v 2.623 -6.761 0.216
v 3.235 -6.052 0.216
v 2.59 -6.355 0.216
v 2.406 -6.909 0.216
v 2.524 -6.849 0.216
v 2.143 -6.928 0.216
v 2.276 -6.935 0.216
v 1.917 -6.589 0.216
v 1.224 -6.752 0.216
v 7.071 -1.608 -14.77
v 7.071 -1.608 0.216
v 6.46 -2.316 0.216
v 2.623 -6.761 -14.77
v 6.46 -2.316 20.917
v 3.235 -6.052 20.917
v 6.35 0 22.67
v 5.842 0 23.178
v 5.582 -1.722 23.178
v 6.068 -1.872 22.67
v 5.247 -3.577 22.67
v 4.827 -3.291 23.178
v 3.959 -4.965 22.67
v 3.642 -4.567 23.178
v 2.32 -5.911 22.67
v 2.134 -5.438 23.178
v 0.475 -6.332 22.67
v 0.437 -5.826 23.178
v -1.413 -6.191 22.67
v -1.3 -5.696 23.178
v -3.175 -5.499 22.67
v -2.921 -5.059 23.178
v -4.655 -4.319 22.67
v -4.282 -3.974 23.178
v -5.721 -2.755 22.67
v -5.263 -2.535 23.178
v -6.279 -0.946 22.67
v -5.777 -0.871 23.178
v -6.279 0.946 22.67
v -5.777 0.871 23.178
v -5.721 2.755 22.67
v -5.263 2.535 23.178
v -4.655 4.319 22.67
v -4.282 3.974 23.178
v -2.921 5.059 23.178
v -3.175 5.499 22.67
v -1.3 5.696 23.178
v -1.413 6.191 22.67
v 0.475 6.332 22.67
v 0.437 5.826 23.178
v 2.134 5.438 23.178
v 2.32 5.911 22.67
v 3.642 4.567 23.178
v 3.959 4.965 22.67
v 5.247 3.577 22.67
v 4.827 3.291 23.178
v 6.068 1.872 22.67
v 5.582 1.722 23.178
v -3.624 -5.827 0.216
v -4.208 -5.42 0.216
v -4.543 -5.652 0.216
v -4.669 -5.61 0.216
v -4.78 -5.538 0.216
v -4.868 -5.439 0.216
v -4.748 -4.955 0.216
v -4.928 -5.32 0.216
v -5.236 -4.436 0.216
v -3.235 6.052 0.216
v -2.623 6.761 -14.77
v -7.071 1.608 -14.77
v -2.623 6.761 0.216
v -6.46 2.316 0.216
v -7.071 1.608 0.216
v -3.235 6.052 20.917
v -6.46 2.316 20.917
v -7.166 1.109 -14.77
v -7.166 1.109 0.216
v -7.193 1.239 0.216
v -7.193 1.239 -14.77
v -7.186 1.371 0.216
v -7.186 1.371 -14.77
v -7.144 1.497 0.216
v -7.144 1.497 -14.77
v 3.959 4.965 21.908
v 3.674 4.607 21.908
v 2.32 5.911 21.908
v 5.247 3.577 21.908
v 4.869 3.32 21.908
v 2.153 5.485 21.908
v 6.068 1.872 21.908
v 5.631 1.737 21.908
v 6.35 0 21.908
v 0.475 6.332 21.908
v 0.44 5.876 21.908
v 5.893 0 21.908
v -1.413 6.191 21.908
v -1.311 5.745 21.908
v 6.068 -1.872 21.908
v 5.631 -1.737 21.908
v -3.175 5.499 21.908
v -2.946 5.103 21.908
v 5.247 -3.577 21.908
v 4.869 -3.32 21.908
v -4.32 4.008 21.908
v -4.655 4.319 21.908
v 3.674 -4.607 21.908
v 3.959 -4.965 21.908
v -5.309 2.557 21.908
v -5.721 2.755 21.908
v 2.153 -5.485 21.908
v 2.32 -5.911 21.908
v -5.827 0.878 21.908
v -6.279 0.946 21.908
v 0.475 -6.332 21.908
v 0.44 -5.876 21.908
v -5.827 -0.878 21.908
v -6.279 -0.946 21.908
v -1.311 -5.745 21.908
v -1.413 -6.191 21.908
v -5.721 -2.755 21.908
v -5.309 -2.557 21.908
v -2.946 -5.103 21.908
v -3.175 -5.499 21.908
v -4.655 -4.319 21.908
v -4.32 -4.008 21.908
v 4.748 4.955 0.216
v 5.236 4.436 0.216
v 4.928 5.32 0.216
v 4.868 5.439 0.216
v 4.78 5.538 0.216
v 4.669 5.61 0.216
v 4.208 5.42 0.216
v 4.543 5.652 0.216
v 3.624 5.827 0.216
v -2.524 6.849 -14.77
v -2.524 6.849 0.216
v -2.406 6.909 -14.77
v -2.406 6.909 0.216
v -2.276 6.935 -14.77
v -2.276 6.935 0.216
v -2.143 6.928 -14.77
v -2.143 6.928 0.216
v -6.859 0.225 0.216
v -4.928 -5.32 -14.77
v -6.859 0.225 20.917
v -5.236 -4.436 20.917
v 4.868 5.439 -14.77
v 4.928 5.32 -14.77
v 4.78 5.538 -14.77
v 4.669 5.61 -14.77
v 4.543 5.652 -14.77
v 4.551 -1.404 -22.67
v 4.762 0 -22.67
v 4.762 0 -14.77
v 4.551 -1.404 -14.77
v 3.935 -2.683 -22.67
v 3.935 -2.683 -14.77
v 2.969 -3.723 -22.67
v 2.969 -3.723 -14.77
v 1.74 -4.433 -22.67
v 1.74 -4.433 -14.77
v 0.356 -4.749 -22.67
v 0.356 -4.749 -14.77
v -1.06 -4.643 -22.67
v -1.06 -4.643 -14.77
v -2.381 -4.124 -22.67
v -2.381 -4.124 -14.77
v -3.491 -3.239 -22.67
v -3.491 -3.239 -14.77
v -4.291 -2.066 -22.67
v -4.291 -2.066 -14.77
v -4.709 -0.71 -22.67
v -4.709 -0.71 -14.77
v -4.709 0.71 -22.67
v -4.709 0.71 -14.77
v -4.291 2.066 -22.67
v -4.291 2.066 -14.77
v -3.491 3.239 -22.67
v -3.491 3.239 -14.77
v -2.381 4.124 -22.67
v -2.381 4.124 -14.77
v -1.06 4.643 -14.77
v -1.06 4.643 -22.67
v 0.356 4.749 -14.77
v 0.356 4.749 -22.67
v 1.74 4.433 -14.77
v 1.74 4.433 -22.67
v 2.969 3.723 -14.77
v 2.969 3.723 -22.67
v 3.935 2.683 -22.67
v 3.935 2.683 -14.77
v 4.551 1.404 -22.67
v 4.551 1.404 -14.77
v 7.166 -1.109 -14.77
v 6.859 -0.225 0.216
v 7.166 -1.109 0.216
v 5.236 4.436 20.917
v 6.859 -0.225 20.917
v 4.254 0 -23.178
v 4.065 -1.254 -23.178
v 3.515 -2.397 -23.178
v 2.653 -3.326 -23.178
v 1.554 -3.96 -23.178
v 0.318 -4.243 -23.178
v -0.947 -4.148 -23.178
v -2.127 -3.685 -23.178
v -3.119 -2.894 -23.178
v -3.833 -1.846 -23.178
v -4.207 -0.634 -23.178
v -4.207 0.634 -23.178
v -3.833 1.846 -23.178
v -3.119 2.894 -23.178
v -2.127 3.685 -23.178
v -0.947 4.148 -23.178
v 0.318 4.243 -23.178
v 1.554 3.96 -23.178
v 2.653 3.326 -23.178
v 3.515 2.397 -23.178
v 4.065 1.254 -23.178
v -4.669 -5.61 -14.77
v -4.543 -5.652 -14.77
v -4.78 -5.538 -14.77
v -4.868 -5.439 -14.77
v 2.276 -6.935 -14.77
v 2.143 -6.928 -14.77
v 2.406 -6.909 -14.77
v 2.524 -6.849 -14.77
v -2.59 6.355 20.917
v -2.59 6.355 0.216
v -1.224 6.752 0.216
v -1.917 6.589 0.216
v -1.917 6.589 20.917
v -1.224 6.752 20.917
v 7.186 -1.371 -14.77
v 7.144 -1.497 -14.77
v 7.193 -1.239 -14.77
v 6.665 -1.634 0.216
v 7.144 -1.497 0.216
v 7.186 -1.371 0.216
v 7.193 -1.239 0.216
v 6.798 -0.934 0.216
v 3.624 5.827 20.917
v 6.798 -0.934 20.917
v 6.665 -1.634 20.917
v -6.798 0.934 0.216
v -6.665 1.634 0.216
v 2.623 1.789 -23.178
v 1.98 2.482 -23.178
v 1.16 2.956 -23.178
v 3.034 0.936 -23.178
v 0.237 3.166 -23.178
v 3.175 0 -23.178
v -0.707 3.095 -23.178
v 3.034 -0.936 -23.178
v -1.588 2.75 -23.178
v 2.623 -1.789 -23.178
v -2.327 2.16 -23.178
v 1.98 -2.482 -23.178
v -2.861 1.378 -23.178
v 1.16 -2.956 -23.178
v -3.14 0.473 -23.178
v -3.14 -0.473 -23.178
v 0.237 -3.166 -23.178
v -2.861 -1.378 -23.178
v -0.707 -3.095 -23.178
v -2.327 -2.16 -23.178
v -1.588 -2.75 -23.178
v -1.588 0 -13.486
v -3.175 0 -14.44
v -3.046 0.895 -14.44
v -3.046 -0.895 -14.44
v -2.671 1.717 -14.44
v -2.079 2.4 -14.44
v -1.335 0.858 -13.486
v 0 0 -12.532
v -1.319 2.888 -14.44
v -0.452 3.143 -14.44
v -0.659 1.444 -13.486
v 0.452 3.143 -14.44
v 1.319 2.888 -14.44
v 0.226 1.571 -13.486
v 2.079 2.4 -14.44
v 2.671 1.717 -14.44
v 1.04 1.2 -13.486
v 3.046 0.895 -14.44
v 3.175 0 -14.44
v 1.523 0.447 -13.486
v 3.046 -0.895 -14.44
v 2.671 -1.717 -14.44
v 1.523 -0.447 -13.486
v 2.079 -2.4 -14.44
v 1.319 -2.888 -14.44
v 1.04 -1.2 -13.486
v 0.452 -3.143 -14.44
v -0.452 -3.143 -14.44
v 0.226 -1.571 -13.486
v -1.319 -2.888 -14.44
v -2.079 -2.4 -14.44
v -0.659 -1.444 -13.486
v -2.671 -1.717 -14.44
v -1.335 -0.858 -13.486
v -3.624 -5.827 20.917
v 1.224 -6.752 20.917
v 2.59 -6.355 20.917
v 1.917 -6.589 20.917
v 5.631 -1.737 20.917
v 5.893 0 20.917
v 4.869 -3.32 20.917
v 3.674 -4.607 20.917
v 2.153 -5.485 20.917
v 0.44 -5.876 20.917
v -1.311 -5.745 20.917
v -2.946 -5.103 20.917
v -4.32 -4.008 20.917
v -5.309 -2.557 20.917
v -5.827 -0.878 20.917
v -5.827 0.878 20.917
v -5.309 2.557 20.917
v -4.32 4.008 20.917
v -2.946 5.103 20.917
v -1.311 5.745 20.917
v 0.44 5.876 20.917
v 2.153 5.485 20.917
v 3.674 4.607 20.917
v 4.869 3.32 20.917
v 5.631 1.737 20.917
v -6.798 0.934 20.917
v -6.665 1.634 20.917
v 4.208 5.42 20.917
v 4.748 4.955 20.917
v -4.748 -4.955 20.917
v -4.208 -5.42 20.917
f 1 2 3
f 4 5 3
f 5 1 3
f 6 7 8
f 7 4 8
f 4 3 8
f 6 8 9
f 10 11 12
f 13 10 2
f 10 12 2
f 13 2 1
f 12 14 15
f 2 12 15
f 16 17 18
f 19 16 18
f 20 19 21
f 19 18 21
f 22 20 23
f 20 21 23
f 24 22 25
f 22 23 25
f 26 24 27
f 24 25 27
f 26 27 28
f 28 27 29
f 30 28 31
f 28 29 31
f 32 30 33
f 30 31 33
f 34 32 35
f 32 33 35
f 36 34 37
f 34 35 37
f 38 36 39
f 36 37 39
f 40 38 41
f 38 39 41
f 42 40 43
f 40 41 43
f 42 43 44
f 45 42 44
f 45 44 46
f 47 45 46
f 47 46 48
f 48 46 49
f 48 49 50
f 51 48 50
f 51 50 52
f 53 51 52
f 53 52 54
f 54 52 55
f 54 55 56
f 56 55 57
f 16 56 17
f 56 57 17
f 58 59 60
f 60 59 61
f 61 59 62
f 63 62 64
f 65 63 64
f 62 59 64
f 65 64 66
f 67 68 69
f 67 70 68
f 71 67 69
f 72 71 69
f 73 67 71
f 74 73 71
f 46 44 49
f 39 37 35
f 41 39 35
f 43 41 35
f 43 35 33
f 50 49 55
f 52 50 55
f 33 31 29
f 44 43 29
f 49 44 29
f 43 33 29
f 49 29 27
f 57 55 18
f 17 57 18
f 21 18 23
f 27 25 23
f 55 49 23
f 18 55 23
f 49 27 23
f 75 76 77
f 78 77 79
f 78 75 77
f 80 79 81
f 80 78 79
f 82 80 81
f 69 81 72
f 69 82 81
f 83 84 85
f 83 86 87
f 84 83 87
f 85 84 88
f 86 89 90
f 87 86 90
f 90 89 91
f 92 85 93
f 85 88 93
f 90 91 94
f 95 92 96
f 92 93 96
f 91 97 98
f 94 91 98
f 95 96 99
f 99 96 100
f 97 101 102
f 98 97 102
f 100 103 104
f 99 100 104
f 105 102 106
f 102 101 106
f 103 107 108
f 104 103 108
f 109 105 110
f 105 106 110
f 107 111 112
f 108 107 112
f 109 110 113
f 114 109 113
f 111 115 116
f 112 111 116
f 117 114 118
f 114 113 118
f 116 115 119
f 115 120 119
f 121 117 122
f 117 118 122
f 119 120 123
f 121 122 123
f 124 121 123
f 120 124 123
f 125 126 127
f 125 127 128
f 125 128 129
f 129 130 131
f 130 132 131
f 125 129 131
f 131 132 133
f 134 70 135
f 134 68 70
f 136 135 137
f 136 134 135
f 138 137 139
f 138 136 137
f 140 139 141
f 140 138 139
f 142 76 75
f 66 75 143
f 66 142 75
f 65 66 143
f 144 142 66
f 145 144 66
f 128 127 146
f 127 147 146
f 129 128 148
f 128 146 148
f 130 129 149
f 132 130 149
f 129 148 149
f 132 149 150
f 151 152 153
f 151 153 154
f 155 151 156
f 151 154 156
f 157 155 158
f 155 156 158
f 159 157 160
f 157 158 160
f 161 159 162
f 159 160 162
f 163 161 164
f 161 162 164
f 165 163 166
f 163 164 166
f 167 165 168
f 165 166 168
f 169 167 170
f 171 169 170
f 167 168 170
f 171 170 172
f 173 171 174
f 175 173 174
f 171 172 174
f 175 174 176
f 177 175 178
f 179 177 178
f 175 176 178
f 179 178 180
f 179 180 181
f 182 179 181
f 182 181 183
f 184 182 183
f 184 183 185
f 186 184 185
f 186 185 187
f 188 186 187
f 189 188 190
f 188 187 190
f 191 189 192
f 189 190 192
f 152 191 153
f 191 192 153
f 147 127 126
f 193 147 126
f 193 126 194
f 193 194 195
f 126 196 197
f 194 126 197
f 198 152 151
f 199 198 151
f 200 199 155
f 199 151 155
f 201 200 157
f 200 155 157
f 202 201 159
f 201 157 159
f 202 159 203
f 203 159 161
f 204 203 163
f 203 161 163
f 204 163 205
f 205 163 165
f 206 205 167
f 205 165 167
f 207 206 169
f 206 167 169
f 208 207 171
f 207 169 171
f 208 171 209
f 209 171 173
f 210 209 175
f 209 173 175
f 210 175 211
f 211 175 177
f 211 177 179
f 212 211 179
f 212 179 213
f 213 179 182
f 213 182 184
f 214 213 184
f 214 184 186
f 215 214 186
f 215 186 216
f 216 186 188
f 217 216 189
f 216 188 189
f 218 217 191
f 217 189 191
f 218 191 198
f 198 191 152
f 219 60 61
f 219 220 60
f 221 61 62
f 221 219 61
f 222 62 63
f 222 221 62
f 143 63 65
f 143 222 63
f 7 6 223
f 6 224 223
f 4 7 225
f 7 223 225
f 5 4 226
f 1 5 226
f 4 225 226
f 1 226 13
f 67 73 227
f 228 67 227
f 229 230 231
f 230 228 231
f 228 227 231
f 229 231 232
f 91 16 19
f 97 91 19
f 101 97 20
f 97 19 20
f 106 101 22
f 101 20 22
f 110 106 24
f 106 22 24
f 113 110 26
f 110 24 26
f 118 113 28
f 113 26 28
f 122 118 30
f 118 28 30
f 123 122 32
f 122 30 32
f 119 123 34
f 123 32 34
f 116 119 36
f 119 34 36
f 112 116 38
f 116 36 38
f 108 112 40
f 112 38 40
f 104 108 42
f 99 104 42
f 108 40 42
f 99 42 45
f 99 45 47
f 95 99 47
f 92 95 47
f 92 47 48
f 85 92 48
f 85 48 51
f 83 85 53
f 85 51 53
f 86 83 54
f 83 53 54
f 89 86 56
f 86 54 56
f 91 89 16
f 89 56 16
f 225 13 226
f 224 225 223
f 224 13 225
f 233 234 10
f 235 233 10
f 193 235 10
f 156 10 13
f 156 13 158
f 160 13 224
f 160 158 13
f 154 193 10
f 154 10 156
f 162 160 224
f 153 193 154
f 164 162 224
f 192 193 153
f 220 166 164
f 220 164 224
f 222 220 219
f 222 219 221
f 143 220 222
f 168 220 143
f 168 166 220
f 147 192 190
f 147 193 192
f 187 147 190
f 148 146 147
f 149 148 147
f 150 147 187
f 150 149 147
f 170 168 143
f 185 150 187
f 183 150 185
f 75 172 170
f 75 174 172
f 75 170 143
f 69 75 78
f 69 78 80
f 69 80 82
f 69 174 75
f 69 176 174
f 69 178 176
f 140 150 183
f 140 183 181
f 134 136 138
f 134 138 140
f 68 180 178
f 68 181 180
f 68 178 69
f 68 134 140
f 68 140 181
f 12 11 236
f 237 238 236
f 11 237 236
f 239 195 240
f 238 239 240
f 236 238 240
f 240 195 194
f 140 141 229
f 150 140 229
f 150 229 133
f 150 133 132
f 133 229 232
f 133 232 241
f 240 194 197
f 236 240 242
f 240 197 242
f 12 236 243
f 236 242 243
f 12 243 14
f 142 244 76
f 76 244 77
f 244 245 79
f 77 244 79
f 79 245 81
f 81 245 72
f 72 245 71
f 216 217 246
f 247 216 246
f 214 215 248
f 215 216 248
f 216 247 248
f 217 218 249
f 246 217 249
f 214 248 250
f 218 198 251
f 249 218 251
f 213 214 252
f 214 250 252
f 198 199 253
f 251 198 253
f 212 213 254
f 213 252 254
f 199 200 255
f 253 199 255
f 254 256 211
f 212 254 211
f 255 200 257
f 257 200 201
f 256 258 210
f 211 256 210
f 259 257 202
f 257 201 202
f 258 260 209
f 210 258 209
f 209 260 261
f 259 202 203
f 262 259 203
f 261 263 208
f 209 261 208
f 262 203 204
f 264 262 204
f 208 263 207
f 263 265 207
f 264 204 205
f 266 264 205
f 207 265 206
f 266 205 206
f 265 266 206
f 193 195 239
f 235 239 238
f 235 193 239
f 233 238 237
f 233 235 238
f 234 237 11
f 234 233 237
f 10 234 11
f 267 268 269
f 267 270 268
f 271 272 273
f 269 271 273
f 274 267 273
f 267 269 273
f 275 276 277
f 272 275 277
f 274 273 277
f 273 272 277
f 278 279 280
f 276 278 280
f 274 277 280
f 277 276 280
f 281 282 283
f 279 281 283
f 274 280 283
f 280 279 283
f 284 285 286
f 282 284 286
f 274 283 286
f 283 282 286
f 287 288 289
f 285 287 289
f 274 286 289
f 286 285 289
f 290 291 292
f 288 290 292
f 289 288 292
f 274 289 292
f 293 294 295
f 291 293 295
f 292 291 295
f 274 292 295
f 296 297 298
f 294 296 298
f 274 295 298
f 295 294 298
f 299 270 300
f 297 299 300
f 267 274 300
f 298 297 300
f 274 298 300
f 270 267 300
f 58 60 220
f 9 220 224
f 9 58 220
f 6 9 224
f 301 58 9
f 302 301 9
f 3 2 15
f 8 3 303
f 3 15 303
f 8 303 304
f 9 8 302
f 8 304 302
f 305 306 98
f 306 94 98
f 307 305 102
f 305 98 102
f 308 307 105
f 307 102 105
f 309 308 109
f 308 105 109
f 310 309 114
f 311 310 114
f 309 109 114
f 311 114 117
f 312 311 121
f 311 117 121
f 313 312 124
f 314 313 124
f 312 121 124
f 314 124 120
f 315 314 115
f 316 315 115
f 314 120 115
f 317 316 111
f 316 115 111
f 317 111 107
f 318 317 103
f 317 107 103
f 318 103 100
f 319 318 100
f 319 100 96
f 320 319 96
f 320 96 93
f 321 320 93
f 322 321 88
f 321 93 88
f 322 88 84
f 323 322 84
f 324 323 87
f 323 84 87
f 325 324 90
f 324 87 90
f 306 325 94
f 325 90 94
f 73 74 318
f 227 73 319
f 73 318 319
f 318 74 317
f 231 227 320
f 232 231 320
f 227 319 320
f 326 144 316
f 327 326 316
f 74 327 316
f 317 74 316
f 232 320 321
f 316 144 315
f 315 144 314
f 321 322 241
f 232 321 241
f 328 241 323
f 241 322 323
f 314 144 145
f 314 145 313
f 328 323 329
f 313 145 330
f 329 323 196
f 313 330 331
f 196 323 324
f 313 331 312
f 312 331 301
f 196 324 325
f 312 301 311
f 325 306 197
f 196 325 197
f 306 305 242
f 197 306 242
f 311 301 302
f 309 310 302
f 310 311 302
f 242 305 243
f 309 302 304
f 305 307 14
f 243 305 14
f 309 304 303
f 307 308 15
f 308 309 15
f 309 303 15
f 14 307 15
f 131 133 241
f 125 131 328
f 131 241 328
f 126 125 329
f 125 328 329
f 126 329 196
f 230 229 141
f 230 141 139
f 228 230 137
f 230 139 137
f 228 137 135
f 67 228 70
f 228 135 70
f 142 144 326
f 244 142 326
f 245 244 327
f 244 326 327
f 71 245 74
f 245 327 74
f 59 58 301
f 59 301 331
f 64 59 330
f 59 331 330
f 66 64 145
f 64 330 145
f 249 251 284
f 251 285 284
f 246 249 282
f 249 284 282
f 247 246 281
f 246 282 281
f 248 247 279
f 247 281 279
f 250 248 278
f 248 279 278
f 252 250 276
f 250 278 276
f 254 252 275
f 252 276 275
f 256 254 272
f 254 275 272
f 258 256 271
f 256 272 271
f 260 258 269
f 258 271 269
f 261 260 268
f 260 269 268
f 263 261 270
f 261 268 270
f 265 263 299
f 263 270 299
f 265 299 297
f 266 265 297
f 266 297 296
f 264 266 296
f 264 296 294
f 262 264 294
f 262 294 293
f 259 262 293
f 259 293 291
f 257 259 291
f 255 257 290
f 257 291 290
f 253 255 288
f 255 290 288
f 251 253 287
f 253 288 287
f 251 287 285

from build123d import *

# Parameters (mm, degrees)
SKETCH3_OUTSIDE_W               = 25.774
SKETCH3_OUTSIDE_H               = 25.774
CUT_EXTRUDE1_DEPTH              = 48.359986768
F_1_4_0_25_DIAMETER_HOLE1_D     = 6.35
F_1_4_0_25_DIAMETER_HOLE1_DEPTH = 8.7376
F_1_4_0_25_DIAMETER_HOLE1_TIP   = 1.907732465
CHAMFER1_SIZE                   = 0.508
BOSS_EXTRUDE1_START             = -14.986
SKETCH7_R                       = 3.175
BOSS_EXTRUDE1_DEPTH             = 14.986
FILLET1_R                       = 0.508


with BuildPart() as part:
    # Sketch2 → Revolve1 (revolve)
    with BuildSketch(Plane(origin=(0, 0, 0), x_dir=(0, 0, -1), z_dir=(1, 0, 0)), mode=Mode.PRIVATE) as revolve1_sk:
        Polygon((-23.1775, 0), (23.1775, 0), (23.1775, 4.7625), (22.6695, 4.7625), (14.7701, 4.7625), (14.7701, 6.862299966), (-20.9169, 6.862299966), (-20.9169, 5.8928), (-21.9075, 5.8928), (-21.9075, 6.35), (-23.1775, 6.35), align=None)
    revolve(revolve1_sk.sketch.rotate(Axis((0, 0, 23.1775), (0, 0, -1)), 90), axis=Axis((0, 0, 23.1775), (0, 0, -1)))

    # Sketch3 outside → Cut-Extrude1 (cut, through all)
    with BuildSketch(Plane.XY.offset(23.1775)):
        Rectangle(SKETCH3_OUTSIDE_W, SKETCH3_OUTSIDE_H)
        Polygon((7.26292966, -1.38571412), (4.83152846, 5.597024532), (-2.4314012, 6.982738652), (-7.26292966, 1.38571412), (-4.83152846, -5.597024532), (2.4314012, -6.982738652), align=None, mode=Mode.SUBTRACT)
    extrude(amount=-CUT_EXTRUDE1_DEPTH, mode=Mode.SUBTRACT)

    # 1/4 (0.25) Diameter Hole1
    with Locations(Plane(origin=(0, 0, -23.1775), x_dir=(-1, 0, 0), z_dir=(0, 0, -1))):
        with Locations((0, 0)):
            Hole(F_1_4_0_25_DIAMETER_HOLE1_D / 2, depth=F_1_4_0_25_DIAMETER_HOLE1_DEPTH)
            with Locations((0, 0, -(F_1_4_0_25_DIAMETER_HOLE1_DEPTH + F_1_4_0_25_DIAMETER_HOLE1_TIP / 2))):  # 118° drill point
                Cone(0, F_1_4_0_25_DIAMETER_HOLE1_D / 2, F_1_4_0_25_DIAMETER_HOLE1_TIP, mode=Mode.SUBTRACT)

    # Chamfer1
    chamfer1_edges = [part.edges().sort_by_distance(p)[0] for p in [
        (-4.7625, 0, -23.1775),
        (-6.35, 0, 23.1775),
    ]]
    chamfer(chamfer1_edges, length=CHAMFER1_SIZE)

    # Sketch7 → Boss-Extrude1 (add)
    with BuildSketch(Plane(origin=(0, 0, -14.7701), x_dir=(-1, 0, 0), z_dir=(0, 0, -1)).offset(BOSS_EXTRUDE1_START)):
        Polygon((-4.83152846, 5.597024532), (-7.26292966, -1.38571412), (-2.4314012, -6.982738652), (4.83152846, -5.597024532), (7.26292966, 1.38571412), (2.4314012, 6.982738652), align=None)
        Circle(SKETCH7_R, mode=Mode.SUBTRACT)
    extrude(amount=BOSS_EXTRUDE1_DEPTH)

    # Fillet1
    fillet1_edges = [part.edges().sort_by_distance(p)[0] for p in [
        (2.4314012, -6.982738652, -7.2771),
        (-4.83152846, -5.597024532, -7.2771),
        (-7.26292966, 1.38571412, -7.2771),
        (-2.4314012, 6.982738652, -7.2771),
        (7.26292966, -1.38571412, -7.2771),
        (4.83152846, 5.597024532, -7.2771),
    ]]
    fillet(fillet1_edges, radius=FILLET1_R)


solid = part.part
